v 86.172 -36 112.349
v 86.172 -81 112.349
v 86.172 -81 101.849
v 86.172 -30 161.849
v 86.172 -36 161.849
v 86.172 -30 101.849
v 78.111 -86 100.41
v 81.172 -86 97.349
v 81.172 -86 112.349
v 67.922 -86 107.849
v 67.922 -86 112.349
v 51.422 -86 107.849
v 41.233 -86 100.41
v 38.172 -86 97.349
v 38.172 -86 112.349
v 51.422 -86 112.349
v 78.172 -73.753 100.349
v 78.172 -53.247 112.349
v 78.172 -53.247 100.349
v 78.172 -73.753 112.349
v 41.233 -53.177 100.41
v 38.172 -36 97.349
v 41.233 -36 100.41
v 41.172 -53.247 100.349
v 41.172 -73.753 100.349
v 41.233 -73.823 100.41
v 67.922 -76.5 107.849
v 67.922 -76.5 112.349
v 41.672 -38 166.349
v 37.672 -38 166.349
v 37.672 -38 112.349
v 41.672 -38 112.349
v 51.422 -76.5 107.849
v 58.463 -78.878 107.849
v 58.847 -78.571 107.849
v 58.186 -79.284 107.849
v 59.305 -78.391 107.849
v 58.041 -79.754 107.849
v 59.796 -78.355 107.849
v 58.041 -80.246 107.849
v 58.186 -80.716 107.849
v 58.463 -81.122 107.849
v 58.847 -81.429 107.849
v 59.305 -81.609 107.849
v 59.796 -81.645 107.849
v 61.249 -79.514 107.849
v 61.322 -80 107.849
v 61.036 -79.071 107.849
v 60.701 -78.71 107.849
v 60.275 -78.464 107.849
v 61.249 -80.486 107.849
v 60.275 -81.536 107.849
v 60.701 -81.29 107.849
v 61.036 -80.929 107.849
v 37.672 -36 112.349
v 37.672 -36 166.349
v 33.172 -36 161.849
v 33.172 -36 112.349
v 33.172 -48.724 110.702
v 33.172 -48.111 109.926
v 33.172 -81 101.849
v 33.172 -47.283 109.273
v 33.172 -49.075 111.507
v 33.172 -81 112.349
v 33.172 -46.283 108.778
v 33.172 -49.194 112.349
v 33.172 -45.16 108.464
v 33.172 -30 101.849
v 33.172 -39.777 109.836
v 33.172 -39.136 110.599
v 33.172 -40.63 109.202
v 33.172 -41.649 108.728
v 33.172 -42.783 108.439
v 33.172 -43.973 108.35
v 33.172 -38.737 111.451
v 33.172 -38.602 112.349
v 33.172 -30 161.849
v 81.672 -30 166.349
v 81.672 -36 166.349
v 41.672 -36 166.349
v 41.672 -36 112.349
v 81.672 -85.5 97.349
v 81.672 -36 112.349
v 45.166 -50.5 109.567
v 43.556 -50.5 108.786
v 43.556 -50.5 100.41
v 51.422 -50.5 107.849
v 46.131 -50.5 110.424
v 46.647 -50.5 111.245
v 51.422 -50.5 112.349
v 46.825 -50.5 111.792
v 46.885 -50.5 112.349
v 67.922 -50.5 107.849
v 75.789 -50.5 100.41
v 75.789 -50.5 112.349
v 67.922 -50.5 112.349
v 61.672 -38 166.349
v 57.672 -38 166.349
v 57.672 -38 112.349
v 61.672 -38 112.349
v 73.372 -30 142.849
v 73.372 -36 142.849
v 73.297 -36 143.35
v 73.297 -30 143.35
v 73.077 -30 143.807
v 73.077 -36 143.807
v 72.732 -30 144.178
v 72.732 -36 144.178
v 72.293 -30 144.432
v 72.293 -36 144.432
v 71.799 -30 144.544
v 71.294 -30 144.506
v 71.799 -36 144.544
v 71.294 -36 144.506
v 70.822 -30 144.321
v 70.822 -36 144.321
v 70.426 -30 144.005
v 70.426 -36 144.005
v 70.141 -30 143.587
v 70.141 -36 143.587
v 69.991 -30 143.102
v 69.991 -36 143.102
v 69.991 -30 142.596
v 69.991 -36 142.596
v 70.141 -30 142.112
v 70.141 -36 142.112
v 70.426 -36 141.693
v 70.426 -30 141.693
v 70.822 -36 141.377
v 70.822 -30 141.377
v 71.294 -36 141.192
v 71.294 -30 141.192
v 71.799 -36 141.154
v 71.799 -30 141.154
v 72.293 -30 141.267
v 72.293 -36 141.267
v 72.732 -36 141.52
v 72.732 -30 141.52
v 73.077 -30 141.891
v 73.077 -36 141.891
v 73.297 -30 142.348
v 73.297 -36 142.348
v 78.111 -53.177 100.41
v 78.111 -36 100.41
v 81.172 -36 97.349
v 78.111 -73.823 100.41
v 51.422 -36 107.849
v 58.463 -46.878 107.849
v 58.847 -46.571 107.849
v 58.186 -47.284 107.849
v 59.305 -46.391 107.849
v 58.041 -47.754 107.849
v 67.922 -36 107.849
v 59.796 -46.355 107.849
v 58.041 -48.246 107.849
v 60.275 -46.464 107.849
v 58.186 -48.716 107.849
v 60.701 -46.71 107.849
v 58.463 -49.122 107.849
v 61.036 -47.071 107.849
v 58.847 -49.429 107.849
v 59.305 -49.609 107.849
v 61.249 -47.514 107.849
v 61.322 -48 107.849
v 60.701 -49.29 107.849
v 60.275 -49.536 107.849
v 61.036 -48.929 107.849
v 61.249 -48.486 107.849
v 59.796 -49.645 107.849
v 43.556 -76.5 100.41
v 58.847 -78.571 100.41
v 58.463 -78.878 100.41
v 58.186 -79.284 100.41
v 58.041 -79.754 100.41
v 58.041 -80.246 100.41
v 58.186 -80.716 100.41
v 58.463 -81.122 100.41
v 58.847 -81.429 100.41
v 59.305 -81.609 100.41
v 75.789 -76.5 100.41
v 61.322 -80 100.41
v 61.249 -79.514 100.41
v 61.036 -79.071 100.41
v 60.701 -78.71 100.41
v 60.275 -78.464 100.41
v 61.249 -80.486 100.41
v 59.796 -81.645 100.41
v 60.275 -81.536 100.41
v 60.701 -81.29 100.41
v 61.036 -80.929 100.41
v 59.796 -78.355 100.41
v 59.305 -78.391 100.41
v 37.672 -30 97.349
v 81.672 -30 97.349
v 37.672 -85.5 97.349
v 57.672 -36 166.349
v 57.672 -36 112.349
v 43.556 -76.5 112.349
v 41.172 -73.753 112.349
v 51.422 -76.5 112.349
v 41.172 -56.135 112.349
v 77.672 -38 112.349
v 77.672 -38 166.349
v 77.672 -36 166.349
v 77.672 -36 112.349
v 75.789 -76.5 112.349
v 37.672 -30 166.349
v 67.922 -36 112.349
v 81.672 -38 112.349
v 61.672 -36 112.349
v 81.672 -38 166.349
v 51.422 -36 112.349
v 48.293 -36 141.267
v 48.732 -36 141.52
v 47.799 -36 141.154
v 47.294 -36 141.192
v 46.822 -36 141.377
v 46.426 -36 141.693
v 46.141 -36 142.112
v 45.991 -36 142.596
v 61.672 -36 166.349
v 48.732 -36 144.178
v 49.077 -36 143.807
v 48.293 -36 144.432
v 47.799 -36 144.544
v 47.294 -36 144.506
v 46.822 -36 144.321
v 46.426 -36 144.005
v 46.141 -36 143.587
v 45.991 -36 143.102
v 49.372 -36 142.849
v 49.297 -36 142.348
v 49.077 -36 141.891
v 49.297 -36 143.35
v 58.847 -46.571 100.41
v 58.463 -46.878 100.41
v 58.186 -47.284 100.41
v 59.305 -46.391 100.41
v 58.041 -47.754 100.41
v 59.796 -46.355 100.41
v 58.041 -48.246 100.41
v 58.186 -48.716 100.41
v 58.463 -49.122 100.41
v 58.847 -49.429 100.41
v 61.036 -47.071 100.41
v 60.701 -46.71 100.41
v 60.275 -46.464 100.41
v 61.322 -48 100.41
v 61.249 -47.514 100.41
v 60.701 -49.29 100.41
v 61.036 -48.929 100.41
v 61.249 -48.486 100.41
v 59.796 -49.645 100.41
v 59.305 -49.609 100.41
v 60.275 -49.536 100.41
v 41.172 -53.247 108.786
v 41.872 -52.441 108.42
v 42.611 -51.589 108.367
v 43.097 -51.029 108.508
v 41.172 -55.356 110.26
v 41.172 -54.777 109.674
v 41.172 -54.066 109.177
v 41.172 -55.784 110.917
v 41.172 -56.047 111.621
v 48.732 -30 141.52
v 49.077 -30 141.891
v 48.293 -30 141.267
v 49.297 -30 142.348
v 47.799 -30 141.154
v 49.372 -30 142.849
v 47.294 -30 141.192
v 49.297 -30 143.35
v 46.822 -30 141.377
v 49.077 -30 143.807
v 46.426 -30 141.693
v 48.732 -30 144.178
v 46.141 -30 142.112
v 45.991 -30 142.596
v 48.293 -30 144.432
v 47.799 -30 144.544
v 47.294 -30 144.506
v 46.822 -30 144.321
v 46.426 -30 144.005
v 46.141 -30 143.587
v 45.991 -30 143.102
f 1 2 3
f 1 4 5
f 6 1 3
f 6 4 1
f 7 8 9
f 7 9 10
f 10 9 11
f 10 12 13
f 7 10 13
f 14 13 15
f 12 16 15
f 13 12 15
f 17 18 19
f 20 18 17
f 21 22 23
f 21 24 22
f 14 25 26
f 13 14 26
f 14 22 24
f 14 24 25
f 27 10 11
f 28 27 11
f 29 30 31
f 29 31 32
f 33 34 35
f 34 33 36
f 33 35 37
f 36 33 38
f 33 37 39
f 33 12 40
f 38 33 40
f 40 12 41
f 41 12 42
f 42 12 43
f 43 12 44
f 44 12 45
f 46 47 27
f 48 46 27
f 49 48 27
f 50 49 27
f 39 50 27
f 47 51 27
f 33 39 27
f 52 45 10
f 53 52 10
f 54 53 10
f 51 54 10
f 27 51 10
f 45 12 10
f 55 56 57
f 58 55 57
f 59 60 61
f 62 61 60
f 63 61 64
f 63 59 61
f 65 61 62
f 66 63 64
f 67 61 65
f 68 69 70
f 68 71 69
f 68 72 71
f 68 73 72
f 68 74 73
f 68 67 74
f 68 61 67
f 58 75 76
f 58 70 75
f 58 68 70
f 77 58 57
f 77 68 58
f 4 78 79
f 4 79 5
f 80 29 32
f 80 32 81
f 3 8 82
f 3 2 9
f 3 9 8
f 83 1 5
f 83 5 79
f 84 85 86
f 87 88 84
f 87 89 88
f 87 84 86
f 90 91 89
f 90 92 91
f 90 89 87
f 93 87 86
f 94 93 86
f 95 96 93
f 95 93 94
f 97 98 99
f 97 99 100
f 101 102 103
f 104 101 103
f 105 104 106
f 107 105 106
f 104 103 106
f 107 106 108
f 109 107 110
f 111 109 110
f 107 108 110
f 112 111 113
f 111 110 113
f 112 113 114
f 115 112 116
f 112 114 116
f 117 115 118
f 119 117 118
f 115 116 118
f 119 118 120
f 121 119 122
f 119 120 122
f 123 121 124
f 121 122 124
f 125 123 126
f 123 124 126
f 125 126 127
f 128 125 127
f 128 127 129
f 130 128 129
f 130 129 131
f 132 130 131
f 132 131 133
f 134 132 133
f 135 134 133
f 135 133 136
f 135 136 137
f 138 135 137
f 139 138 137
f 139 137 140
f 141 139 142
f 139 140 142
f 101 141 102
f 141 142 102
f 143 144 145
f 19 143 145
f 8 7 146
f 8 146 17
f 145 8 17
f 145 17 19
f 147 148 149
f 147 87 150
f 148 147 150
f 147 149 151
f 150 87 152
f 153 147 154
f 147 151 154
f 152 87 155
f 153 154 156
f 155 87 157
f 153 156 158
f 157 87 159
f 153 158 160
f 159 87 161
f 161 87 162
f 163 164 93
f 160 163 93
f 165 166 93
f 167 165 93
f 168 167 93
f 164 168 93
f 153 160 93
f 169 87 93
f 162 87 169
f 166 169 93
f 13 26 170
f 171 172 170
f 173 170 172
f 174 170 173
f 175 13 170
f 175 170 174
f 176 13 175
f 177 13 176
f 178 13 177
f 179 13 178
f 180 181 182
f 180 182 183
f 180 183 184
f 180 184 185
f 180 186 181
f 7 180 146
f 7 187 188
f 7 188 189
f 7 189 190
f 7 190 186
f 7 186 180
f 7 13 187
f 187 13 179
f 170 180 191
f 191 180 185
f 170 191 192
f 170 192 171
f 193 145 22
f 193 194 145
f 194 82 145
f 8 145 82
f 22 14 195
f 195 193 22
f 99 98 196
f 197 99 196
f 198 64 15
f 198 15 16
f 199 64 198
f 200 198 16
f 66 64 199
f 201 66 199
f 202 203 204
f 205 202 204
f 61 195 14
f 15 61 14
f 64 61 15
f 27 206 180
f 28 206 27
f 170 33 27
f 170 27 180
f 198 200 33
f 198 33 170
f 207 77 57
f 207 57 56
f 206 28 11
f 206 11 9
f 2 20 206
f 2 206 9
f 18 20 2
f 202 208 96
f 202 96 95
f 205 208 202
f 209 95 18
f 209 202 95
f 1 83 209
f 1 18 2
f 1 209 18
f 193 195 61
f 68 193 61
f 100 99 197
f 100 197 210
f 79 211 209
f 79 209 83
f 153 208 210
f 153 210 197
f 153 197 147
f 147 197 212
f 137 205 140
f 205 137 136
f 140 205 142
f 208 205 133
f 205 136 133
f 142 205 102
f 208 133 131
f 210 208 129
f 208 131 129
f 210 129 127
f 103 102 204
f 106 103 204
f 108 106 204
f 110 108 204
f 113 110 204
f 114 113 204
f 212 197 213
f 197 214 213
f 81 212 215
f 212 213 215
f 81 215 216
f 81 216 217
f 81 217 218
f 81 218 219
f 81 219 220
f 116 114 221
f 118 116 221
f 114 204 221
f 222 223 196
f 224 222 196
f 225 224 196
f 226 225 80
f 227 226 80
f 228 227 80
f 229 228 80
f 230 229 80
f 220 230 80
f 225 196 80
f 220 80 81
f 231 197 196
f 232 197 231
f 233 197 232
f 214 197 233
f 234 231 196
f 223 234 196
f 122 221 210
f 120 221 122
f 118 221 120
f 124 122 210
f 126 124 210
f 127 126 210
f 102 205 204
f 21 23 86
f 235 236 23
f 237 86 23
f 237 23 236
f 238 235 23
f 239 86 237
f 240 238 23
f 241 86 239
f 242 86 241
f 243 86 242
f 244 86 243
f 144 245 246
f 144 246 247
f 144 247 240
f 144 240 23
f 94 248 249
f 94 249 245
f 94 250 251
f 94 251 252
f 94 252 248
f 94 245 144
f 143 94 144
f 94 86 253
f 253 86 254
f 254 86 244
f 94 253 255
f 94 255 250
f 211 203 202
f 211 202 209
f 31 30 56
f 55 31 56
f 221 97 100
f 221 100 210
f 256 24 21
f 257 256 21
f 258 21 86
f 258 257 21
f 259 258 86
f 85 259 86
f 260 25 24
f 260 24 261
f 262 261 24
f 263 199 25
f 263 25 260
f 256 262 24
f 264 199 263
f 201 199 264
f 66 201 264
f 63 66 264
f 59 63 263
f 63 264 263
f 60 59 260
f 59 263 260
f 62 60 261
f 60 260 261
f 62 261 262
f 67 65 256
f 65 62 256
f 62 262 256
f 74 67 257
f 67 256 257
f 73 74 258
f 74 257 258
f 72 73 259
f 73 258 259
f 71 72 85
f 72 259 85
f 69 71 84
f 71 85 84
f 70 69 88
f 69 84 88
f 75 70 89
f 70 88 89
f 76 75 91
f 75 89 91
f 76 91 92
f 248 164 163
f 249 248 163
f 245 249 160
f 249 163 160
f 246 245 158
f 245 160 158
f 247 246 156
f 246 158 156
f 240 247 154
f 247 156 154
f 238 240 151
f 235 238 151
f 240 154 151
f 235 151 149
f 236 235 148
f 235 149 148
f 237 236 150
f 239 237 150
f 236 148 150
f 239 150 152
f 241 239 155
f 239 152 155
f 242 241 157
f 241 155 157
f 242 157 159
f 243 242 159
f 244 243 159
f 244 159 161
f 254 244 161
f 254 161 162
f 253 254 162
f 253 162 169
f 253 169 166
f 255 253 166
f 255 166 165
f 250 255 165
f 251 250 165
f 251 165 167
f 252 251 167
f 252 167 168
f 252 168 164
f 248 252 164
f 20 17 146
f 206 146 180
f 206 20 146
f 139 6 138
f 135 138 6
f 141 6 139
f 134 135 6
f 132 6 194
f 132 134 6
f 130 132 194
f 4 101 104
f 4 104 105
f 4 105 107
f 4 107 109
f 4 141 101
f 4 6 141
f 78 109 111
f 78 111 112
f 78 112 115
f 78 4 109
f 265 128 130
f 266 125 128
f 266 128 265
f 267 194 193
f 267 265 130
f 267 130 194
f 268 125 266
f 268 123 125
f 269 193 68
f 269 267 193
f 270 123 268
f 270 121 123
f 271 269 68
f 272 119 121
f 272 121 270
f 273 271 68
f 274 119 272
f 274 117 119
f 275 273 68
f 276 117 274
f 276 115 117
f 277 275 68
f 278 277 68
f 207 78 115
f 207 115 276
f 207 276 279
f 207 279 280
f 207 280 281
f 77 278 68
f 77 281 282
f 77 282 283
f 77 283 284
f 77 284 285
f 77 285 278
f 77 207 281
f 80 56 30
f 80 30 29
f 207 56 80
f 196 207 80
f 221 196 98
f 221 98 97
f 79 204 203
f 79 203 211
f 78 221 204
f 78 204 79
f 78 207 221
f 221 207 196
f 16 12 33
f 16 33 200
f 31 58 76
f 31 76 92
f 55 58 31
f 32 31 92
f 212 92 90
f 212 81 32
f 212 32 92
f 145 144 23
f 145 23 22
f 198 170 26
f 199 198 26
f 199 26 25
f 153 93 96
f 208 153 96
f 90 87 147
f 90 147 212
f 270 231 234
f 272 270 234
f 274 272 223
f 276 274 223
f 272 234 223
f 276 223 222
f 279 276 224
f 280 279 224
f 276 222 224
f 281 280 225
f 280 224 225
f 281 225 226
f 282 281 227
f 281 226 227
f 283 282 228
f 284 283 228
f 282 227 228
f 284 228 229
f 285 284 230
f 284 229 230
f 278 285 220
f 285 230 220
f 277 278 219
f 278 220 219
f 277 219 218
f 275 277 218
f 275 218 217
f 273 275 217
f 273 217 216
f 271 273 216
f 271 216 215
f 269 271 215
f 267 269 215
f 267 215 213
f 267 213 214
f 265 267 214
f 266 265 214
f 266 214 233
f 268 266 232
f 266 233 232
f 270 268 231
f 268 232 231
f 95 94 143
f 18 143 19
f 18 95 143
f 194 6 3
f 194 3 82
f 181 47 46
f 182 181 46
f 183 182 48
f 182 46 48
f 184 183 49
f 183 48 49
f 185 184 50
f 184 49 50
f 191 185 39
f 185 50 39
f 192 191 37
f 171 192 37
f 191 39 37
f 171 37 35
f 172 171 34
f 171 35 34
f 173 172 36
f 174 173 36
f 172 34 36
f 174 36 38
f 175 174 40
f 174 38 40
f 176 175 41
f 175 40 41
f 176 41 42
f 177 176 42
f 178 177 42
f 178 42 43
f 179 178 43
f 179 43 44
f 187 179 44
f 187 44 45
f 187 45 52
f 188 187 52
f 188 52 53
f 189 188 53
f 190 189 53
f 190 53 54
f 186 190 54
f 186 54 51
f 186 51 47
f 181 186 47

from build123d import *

# Parameters (mm, degrees)
EXTRUDE_DEPTH                     = 6
EXTRUDE_ONTO_SKETCH039_ROLL_ANGLE = 90
SKETCH041_R                       = 1.7
POCKET009_DEPTH                   = 6
PAD006_DEPTH                      = 50
CHAMFER009_SIZE                   = 5
SKETCH043_W                       = 4
SKETCH043_H                       = 2
PAD007_DEPTH                      = 54
POCKET010_DEPTH                   = 50
POCKET011_DEPTH                   = 12
SKETCH047_W                       = 16.5
SKETCH047_H                       = 4.5
POCKET012_DEPTH                   = 50
SKETCH048_R                       = 1.65
POCKET013_DEPTH                   = 10
POCKET014_DEPTH                   = 16


with BuildPart() as part:
    # Sketch039 as drawn → Extrude (new)
    with BuildSketch(Plane.XY):
        Polygon((44.672363, 146.349121), (88.672363, 146.349121), (93.172363, 141.849121), (93.172363, 81.849121), (88.672363, 77.349121), (44.672363, 77.349121), (40.172363, 81.849121), (40.172363, 141.849121), align=None)
    extrude(amount=EXTRUDE_DEPTH)


with BuildPart() as part_1:
    # Extrude onto Sketch039 roll: moved
    add(part.part.rotate(Axis((0, 0, 0), (1, 0, 0)), EXTRUDE_ONTO_SKETCH039_ROLL_ANGLE))


with BuildPart() as part_2:
    # Extrude onto Sketch039 placement: moved
    add(part_1.part.moved(Location((-7, -30, 20))))

    # Sketch041 → Pocket009 (cut)
    with BuildSketch(Plane.XZ.offset(36)):
        with Locations((47.672363, 142.849121)):
            Circle(SKETCH041_R)
        with Locations((71.672363, 142.849121)):
            Circle(SKETCH041_R)
    extrude(amount=-POCKET009_DEPTH, mode=Mode.SUBTRACT)

    # Sketch042 → Pad006 (new body)
    with BuildSketch(Plane.XZ.offset(36)):
        Polygon((33.172363, 112.349121), (86.172363, 112.349121), (86.172363, 101.849121), (81.672363, 97.349121), (37.672363, 97.349121), (33.172363, 101.849121), align=None)
    extrude(amount=PAD006_DEPTH)

    # Chamfer009
    chamfer009_edges = [part_2.edges().sort_by_distance(p)[0] for p in [
        (86.172363, -86, 107.099121),
        (33.172363, -86, 107.099121),
    ]]
    chamfer(chamfer009_edges, length=CHAMFER009_SIZE)

    # Sketch043 → Pad007 (new body)
    with BuildSketch(Plane.XY.offset(166.349121)):
        with Locations((39.672363, -37)):
            Rectangle(SKETCH043_W, SKETCH043_H)
        with Locations((79.672363, -37)):
            Rectangle(SKETCH043_W, SKETCH043_H)
        with Locations((59.672363, -37)):
            Rectangle(SKETCH043_W, SKETCH043_H)
    extrude(amount=-PAD007_DEPTH)

    # Sketch044 → Pocket010 (cut)
    with BuildSketch(Plane.XZ.offset(86)):
        Polygon((38.172363, 97.349121), (41.233486, 100.410242), (78.111243, 100.410242), (81.172363, 97.349121), align=None)
    extrude(amount=-POCKET010_DEPTH, mode=Mode.SUBTRACT)

    # Sketch046 → Pocket011 (cut)
    with BuildSketch(Plane.XY.offset(112.349121)):
        Polygon((41.172363, -73.752892), (41.172363, -53.247108), (43.556055, -50.5), (75.788672, -50.5), (78.172363, -53.247108), (78.172363, -73.752892), (75.788672, -76.5), (43.556055, -76.5), align=None)
    extrude(amount=-POCKET011_DEPTH, mode=Mode.SUBTRACT)

    # Sketch047 → Pocket012 (cut)
    with BuildSketch(Plane.XZ.offset(86)):
        with Locations((59.672363, 110.099121)):
            Rectangle(SKETCH047_W, SKETCH047_H)
    extrude(amount=-POCKET012_DEPTH, mode=Mode.SUBTRACT)

    # Sketch048 → Pocket013 (cut)
    with BuildSketch(Plane.XY.offset(107.849121)):
        with Locations((59.672363, -80)):
            Circle(SKETCH048_R)
        with Locations((59.672363, -48)):
            Circle(SKETCH048_R)
    extrude(amount=-POCKET013_DEPTH, mode=Mode.SUBTRACT)

    # Sketch049 → Pocket014 (cut, symmetric)
    with BuildSketch(Plane(origin=(49.845623, -43.251529, 0), x_dir=(0.65538, 0.755299, 0), z_dir=(0.755299, -0.65538, 0))):
        with BuildLine():
            ThreePointArc((-15.415378, 112.349121), (-11.415378, 108.349121), (-7.415378, 112.349121))
            Line((-15.415378, 112.349121), (-7.415378, 112.349121))
        make_face()
    extrude(amount=POCKET014_DEPTH, both=True, mode=Mode.SUBTRACT)


solid = part_2.part
